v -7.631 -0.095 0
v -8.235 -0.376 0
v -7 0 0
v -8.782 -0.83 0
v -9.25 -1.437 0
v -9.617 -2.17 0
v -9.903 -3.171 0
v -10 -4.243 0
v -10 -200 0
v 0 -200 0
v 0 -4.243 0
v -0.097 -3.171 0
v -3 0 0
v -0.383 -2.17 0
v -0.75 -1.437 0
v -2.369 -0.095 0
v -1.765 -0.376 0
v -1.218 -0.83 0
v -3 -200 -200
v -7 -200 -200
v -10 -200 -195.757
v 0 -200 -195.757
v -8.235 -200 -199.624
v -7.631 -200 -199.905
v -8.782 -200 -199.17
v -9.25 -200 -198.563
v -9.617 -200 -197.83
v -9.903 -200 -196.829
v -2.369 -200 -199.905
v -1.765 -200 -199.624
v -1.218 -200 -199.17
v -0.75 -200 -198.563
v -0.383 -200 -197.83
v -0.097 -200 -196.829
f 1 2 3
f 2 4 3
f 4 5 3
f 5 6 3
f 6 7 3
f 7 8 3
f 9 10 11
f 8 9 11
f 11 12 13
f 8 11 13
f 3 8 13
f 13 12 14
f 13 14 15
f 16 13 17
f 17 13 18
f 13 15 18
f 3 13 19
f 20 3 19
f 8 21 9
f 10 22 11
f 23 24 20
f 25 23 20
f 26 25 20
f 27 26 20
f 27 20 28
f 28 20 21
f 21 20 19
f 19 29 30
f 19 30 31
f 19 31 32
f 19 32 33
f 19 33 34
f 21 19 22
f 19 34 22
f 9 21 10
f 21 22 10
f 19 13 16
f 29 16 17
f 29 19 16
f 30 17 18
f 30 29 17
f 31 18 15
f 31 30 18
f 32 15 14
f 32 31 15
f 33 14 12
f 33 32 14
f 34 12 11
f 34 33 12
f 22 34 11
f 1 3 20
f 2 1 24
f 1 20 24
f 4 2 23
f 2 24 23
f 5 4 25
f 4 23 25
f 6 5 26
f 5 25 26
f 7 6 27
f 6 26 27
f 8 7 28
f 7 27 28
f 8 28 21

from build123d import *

# Parameters (mm, degrees)
BASE_FLANGE1_DEPTH = 10
FILLET1_R          = 3


# Sheet-metal steps are written as plain solids
with BuildPart() as part:
    # Sketch1 → Base-Flange1 (new body)
    with BuildSketch(Plane(origin=(0, 0, 0), x_dir=(0, 0, -1), z_dir=(1, 0, 0))):
        Polygon((0, 0), (200, -200), (0, -200), align=None)
    extrude(amount=-BASE_FLANGE1_DEPTH)

    # Fillet1
    fillet1_edges = [part.edges().sort_by_distance(p)[0] for p in [
        (-10, -100, -100),
        (0, -100, -100),
    ]]
    fillet(fillet1_edges, radius=FILLET1_R)


solid = part.part
